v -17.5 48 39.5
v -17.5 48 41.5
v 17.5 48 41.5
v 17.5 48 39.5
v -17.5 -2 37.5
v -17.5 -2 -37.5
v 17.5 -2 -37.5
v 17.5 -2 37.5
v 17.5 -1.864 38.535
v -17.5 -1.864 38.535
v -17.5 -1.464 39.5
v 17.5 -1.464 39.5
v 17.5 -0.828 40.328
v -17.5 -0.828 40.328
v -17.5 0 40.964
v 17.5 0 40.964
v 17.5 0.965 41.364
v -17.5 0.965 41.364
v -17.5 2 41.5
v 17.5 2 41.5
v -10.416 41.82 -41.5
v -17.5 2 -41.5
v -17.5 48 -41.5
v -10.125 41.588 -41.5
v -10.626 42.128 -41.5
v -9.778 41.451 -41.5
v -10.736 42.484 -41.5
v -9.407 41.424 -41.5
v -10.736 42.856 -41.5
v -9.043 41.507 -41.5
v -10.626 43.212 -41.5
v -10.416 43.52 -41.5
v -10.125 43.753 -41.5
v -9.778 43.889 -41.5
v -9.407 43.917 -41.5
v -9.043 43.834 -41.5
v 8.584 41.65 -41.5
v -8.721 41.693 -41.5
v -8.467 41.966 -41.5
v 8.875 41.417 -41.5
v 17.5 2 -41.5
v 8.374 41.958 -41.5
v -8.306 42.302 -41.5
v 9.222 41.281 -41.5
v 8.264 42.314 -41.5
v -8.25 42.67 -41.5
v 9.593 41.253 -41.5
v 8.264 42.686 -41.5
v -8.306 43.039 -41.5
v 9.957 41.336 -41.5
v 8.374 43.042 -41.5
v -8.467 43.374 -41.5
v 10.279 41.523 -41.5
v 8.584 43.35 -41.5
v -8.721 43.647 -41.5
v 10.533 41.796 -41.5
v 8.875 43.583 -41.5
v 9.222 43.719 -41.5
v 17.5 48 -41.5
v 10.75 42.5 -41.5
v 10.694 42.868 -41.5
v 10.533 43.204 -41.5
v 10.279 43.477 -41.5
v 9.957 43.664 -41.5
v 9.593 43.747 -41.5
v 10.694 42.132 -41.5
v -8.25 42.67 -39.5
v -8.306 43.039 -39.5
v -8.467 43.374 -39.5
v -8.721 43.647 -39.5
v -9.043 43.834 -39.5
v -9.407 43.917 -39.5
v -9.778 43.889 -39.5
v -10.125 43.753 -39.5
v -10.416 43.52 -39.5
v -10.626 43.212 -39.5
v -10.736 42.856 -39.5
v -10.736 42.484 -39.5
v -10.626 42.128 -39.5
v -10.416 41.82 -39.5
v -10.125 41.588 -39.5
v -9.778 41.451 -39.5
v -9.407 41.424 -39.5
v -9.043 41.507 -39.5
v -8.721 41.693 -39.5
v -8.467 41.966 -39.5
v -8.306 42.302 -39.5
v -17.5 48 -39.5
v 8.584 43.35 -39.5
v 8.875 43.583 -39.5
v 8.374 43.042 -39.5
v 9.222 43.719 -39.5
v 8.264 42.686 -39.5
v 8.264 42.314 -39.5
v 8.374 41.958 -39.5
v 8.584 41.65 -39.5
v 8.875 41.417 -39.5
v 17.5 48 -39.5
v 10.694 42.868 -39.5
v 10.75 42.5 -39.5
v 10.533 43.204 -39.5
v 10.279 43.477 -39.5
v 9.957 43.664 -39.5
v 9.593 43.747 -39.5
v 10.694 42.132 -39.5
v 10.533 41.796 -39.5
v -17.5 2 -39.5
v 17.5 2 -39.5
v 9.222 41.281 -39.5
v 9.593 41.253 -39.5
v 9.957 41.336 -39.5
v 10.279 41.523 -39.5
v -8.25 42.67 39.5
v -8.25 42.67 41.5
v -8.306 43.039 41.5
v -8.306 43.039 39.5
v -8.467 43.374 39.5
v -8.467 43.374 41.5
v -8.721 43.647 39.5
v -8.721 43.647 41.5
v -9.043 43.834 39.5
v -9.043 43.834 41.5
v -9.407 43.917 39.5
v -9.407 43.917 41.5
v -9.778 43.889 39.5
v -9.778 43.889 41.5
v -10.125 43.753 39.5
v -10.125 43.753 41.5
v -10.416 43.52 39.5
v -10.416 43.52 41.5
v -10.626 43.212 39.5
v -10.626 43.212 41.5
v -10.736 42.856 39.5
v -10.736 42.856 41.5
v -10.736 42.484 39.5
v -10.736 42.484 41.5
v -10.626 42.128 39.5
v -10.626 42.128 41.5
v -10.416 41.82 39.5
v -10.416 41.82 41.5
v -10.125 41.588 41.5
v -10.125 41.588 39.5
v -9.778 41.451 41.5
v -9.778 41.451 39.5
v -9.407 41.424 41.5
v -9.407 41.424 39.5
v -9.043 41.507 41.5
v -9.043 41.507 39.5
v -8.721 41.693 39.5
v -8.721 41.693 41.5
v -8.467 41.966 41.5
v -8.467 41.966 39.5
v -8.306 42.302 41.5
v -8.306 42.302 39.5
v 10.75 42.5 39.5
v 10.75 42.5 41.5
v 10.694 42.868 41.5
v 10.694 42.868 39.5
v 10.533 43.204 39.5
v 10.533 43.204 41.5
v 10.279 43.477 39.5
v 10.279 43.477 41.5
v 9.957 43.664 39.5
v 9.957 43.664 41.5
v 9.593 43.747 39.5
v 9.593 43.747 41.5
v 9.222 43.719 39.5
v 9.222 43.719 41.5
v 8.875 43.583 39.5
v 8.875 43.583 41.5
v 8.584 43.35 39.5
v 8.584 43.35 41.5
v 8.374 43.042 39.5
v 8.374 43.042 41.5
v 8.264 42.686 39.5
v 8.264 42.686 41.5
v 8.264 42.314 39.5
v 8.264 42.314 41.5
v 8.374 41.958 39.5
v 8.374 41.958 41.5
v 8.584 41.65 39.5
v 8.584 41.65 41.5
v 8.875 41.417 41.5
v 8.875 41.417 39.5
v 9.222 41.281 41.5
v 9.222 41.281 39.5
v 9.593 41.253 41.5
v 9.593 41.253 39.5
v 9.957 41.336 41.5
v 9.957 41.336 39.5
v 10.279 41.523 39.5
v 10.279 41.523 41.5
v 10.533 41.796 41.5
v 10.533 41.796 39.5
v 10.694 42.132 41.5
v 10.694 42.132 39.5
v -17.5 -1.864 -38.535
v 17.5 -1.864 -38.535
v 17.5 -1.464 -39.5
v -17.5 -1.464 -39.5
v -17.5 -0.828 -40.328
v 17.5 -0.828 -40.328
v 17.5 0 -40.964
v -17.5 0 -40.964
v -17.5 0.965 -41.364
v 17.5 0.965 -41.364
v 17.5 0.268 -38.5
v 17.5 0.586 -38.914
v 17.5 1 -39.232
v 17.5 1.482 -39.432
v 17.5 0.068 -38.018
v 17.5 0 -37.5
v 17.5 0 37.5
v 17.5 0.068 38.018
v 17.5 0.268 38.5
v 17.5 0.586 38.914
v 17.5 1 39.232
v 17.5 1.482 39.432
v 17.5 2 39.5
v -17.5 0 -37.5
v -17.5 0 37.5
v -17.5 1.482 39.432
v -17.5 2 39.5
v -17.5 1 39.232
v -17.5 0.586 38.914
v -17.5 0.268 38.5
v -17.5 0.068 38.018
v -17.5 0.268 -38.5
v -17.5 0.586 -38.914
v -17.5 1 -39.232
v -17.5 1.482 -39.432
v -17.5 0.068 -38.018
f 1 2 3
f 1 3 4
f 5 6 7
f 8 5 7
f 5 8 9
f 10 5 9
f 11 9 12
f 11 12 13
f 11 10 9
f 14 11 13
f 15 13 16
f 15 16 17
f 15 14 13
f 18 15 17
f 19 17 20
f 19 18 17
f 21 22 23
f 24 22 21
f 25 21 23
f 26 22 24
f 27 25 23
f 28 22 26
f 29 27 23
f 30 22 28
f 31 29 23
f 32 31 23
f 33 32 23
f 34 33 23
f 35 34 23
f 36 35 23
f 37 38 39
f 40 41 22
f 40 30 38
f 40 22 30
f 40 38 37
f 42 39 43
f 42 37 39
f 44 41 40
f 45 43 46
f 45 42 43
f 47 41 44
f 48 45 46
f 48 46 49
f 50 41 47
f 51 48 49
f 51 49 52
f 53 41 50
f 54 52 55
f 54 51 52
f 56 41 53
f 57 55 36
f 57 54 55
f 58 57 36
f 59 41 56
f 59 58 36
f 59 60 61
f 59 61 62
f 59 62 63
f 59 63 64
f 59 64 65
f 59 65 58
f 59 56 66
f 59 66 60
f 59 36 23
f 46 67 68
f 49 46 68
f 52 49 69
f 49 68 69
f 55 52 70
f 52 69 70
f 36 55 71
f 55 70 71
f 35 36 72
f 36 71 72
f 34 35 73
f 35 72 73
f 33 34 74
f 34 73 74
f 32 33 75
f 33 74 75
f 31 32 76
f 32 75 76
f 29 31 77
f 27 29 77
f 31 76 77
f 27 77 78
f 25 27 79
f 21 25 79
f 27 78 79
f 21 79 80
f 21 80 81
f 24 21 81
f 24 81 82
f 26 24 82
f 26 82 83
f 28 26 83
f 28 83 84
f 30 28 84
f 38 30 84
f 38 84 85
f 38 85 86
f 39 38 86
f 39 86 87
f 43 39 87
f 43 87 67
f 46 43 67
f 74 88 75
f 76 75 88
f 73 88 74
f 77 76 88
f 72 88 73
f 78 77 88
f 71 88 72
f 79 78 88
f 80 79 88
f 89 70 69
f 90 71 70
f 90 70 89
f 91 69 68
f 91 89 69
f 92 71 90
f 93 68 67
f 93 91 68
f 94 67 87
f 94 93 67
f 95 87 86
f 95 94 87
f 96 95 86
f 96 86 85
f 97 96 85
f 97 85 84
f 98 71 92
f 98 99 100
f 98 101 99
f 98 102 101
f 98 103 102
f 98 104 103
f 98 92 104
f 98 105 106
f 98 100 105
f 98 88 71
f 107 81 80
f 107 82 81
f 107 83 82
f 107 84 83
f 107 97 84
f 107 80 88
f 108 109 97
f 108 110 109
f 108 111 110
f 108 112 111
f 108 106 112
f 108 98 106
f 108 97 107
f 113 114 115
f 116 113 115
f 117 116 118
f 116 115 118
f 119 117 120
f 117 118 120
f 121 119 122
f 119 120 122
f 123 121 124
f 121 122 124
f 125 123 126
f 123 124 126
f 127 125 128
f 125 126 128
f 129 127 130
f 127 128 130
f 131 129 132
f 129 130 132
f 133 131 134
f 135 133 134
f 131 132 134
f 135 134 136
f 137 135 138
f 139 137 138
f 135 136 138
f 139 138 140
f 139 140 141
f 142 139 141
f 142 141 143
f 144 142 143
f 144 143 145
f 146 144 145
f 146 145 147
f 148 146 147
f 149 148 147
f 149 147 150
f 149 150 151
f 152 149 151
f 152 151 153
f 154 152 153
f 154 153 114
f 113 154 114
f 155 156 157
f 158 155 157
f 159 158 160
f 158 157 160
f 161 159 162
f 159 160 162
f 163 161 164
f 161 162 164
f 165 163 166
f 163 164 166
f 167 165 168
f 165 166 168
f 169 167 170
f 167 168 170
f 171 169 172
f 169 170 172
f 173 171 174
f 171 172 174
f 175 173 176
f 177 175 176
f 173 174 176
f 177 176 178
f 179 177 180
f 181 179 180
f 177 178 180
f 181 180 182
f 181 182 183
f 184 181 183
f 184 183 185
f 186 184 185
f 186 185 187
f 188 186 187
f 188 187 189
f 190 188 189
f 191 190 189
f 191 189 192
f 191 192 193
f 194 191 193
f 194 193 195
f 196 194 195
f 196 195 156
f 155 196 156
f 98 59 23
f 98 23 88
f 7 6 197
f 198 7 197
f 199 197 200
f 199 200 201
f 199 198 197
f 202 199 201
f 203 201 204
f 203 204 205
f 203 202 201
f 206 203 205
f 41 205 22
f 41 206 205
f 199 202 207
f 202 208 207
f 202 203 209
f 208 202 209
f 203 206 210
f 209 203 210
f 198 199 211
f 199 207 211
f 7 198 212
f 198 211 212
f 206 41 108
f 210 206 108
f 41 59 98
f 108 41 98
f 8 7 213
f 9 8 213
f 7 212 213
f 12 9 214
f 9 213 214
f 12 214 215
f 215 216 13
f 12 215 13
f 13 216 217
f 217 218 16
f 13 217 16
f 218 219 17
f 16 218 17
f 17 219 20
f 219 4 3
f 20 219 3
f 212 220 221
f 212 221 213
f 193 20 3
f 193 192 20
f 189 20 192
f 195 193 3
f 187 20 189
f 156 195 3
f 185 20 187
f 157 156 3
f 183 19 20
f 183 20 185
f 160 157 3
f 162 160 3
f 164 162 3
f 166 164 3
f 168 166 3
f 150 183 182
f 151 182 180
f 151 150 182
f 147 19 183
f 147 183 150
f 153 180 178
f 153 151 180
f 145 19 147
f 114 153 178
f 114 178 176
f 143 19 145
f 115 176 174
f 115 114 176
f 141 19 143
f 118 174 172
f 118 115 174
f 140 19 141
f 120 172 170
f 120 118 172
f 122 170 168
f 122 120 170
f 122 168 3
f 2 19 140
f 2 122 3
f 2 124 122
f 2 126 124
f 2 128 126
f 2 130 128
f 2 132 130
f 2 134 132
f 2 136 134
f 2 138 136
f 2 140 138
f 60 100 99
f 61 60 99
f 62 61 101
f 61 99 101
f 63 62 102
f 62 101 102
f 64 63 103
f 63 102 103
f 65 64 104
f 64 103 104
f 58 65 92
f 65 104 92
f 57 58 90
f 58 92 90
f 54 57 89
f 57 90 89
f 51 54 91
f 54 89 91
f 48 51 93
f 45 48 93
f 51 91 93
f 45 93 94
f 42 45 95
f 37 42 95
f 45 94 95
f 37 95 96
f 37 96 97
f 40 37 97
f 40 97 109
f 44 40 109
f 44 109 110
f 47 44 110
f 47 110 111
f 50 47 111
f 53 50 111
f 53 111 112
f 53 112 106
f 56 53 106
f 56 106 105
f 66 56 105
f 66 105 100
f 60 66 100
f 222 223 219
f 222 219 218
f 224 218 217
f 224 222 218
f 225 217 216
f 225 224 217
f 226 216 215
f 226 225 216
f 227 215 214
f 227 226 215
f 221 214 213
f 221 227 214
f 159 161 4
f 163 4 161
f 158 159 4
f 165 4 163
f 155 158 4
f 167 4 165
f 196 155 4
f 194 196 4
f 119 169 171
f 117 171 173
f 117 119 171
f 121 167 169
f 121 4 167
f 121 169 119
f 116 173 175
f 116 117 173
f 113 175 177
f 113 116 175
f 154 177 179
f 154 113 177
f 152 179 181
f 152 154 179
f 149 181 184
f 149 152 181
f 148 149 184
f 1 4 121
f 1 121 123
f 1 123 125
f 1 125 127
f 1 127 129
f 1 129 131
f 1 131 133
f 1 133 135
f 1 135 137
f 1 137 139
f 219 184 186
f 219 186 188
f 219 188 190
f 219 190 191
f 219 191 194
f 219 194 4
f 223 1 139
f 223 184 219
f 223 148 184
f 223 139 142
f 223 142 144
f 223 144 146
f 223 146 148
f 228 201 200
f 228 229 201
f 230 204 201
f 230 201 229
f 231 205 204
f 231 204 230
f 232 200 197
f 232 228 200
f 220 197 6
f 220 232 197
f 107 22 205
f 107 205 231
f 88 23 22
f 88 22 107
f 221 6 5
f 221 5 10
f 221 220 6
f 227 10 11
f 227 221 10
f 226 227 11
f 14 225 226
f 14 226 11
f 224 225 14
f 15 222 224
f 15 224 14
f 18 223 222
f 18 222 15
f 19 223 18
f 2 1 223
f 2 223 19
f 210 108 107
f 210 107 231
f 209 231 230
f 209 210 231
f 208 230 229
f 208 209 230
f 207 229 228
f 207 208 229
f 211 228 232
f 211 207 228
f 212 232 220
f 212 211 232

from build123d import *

# Parameters (mm, degrees)
SKETCH1_W                      = 35
SKETCH1_H                      = 83
BASE_FLANGE2_DEPTH             = 2
EDGE_FLANGE3_STRIP_W           = 12
EDGE_FLANGE3_STRIP_H           = 2
EDGE_FLANGE3_STRIP_CUT_DEPTH   = 35
EDGE_FLANGE3_STRIP_2_W         = 12
EDGE_FLANGE3_STRIP_2_H         = 2
EDGE_FLANGE3_STRIP_CUT_2_DEPTH = 35
EDGE_FLANGE3_DEPTH             = 35
EDGE_FLANGE3_BEND_DEPTH        = 35
TAP_DRILL_FOR_M3_TAP1_D        = 2.5


# Sheet-metal steps are written as plain solids
with BuildPart() as part:
    # Sketch1 → Base-Flange2 (new body)
    with BuildSketch(Plane(origin=(0, 0, 0), x_dir=(1, 0, 0), z_dir=(0, 1, 0))):
        Rectangle(SKETCH1_W, SKETCH1_H)
    extrude(amount=-BASE_FLANGE2_DEPTH)

    # Edge-Flange3 strip (across the edge) → Edge-Flange3 strip cut (cut)
    with BuildSketch(Plane(origin=(17.5, 0, -41.5), x_dir=(0, 0, 1), z_dir=(-1, 0, 0))):
        with Locations((-2, -1)):
            Rectangle(EDGE_FLANGE3_STRIP_W, EDGE_FLANGE3_STRIP_H)
    extrude(amount=EDGE_FLANGE3_STRIP_CUT_DEPTH, mode=Mode.SUBTRACT)

    # Edge-Flange3 strip 2 (across the edge) → Edge-Flange3 strip cut 2 (cut)
    with BuildSketch(Plane(origin=(-17.5, 0, 41.5), x_dir=(0, 0, -1), z_dir=(1, 0, 0))):
        with Locations((-2, -1)):
            Rectangle(EDGE_FLANGE3_STRIP_2_W, EDGE_FLANGE3_STRIP_2_H)
    extrude(amount=EDGE_FLANGE3_STRIP_CUT_2_DEPTH, mode=Mode.SUBTRACT)

    # Edge-Flange3 section (across the edge) → Edge-Flange3 (add)
    with BuildSketch(Plane(origin=(17.5, 0, -41.5), x_dir=(0, 0, 1), z_dir=(-1, 0, 0))):
        with BuildLine():
            Line((0, 2), (0, 48))
            Line((0, 48), (2, 48))
            Line((2, 48), (2, 2))
            ThreePointArc((2, 2), (2.585786438, 0.585786438), (4, 0))
            Line((4, 0), (4, -2))
            ThreePointArc((4, -2), (1.171572875, -0.828427125), (0, 2))
        make_face()
    extrude(amount=EDGE_FLANGE3_DEPTH)

    # Edge-Flange3 section 2 (across the edge) → Edge-Flange3 bend (add)
    with BuildSketch(Plane(origin=(-17.5, 0, 41.5), x_dir=(0, 0, -1), z_dir=(1, 0, 0))):
        with BuildLine():
            Line((0, 2), (0, 48))
            Line((0, 48), (2, 48))
            Line((2, 48), (2, 2))
            ThreePointArc((2, 2), (2.585786438, 0.585786438), (4, 0))
            Line((4, 0), (4, -2))
            ThreePointArc((4, -2), (1.171572875, -0.828427125), (0, 2))
        make_face()
    extrude(amount=EDGE_FLANGE3_BEND_DEPTH)

    # Tap Drill for M3 Tap1 (through all)
    with Locations(Plane(origin=(-15.830402425, -23.069767603, -43.5), x_dir=(-1, 0, 0), z_dir=(0, 0, -1))):
        with Locations((-25.330402425, 65.569767603), (-6.330402425, 65.739876607)):
            Hole(TAP_DRILL_FOR_M3_TAP1_D / 2)


solid = part.part
